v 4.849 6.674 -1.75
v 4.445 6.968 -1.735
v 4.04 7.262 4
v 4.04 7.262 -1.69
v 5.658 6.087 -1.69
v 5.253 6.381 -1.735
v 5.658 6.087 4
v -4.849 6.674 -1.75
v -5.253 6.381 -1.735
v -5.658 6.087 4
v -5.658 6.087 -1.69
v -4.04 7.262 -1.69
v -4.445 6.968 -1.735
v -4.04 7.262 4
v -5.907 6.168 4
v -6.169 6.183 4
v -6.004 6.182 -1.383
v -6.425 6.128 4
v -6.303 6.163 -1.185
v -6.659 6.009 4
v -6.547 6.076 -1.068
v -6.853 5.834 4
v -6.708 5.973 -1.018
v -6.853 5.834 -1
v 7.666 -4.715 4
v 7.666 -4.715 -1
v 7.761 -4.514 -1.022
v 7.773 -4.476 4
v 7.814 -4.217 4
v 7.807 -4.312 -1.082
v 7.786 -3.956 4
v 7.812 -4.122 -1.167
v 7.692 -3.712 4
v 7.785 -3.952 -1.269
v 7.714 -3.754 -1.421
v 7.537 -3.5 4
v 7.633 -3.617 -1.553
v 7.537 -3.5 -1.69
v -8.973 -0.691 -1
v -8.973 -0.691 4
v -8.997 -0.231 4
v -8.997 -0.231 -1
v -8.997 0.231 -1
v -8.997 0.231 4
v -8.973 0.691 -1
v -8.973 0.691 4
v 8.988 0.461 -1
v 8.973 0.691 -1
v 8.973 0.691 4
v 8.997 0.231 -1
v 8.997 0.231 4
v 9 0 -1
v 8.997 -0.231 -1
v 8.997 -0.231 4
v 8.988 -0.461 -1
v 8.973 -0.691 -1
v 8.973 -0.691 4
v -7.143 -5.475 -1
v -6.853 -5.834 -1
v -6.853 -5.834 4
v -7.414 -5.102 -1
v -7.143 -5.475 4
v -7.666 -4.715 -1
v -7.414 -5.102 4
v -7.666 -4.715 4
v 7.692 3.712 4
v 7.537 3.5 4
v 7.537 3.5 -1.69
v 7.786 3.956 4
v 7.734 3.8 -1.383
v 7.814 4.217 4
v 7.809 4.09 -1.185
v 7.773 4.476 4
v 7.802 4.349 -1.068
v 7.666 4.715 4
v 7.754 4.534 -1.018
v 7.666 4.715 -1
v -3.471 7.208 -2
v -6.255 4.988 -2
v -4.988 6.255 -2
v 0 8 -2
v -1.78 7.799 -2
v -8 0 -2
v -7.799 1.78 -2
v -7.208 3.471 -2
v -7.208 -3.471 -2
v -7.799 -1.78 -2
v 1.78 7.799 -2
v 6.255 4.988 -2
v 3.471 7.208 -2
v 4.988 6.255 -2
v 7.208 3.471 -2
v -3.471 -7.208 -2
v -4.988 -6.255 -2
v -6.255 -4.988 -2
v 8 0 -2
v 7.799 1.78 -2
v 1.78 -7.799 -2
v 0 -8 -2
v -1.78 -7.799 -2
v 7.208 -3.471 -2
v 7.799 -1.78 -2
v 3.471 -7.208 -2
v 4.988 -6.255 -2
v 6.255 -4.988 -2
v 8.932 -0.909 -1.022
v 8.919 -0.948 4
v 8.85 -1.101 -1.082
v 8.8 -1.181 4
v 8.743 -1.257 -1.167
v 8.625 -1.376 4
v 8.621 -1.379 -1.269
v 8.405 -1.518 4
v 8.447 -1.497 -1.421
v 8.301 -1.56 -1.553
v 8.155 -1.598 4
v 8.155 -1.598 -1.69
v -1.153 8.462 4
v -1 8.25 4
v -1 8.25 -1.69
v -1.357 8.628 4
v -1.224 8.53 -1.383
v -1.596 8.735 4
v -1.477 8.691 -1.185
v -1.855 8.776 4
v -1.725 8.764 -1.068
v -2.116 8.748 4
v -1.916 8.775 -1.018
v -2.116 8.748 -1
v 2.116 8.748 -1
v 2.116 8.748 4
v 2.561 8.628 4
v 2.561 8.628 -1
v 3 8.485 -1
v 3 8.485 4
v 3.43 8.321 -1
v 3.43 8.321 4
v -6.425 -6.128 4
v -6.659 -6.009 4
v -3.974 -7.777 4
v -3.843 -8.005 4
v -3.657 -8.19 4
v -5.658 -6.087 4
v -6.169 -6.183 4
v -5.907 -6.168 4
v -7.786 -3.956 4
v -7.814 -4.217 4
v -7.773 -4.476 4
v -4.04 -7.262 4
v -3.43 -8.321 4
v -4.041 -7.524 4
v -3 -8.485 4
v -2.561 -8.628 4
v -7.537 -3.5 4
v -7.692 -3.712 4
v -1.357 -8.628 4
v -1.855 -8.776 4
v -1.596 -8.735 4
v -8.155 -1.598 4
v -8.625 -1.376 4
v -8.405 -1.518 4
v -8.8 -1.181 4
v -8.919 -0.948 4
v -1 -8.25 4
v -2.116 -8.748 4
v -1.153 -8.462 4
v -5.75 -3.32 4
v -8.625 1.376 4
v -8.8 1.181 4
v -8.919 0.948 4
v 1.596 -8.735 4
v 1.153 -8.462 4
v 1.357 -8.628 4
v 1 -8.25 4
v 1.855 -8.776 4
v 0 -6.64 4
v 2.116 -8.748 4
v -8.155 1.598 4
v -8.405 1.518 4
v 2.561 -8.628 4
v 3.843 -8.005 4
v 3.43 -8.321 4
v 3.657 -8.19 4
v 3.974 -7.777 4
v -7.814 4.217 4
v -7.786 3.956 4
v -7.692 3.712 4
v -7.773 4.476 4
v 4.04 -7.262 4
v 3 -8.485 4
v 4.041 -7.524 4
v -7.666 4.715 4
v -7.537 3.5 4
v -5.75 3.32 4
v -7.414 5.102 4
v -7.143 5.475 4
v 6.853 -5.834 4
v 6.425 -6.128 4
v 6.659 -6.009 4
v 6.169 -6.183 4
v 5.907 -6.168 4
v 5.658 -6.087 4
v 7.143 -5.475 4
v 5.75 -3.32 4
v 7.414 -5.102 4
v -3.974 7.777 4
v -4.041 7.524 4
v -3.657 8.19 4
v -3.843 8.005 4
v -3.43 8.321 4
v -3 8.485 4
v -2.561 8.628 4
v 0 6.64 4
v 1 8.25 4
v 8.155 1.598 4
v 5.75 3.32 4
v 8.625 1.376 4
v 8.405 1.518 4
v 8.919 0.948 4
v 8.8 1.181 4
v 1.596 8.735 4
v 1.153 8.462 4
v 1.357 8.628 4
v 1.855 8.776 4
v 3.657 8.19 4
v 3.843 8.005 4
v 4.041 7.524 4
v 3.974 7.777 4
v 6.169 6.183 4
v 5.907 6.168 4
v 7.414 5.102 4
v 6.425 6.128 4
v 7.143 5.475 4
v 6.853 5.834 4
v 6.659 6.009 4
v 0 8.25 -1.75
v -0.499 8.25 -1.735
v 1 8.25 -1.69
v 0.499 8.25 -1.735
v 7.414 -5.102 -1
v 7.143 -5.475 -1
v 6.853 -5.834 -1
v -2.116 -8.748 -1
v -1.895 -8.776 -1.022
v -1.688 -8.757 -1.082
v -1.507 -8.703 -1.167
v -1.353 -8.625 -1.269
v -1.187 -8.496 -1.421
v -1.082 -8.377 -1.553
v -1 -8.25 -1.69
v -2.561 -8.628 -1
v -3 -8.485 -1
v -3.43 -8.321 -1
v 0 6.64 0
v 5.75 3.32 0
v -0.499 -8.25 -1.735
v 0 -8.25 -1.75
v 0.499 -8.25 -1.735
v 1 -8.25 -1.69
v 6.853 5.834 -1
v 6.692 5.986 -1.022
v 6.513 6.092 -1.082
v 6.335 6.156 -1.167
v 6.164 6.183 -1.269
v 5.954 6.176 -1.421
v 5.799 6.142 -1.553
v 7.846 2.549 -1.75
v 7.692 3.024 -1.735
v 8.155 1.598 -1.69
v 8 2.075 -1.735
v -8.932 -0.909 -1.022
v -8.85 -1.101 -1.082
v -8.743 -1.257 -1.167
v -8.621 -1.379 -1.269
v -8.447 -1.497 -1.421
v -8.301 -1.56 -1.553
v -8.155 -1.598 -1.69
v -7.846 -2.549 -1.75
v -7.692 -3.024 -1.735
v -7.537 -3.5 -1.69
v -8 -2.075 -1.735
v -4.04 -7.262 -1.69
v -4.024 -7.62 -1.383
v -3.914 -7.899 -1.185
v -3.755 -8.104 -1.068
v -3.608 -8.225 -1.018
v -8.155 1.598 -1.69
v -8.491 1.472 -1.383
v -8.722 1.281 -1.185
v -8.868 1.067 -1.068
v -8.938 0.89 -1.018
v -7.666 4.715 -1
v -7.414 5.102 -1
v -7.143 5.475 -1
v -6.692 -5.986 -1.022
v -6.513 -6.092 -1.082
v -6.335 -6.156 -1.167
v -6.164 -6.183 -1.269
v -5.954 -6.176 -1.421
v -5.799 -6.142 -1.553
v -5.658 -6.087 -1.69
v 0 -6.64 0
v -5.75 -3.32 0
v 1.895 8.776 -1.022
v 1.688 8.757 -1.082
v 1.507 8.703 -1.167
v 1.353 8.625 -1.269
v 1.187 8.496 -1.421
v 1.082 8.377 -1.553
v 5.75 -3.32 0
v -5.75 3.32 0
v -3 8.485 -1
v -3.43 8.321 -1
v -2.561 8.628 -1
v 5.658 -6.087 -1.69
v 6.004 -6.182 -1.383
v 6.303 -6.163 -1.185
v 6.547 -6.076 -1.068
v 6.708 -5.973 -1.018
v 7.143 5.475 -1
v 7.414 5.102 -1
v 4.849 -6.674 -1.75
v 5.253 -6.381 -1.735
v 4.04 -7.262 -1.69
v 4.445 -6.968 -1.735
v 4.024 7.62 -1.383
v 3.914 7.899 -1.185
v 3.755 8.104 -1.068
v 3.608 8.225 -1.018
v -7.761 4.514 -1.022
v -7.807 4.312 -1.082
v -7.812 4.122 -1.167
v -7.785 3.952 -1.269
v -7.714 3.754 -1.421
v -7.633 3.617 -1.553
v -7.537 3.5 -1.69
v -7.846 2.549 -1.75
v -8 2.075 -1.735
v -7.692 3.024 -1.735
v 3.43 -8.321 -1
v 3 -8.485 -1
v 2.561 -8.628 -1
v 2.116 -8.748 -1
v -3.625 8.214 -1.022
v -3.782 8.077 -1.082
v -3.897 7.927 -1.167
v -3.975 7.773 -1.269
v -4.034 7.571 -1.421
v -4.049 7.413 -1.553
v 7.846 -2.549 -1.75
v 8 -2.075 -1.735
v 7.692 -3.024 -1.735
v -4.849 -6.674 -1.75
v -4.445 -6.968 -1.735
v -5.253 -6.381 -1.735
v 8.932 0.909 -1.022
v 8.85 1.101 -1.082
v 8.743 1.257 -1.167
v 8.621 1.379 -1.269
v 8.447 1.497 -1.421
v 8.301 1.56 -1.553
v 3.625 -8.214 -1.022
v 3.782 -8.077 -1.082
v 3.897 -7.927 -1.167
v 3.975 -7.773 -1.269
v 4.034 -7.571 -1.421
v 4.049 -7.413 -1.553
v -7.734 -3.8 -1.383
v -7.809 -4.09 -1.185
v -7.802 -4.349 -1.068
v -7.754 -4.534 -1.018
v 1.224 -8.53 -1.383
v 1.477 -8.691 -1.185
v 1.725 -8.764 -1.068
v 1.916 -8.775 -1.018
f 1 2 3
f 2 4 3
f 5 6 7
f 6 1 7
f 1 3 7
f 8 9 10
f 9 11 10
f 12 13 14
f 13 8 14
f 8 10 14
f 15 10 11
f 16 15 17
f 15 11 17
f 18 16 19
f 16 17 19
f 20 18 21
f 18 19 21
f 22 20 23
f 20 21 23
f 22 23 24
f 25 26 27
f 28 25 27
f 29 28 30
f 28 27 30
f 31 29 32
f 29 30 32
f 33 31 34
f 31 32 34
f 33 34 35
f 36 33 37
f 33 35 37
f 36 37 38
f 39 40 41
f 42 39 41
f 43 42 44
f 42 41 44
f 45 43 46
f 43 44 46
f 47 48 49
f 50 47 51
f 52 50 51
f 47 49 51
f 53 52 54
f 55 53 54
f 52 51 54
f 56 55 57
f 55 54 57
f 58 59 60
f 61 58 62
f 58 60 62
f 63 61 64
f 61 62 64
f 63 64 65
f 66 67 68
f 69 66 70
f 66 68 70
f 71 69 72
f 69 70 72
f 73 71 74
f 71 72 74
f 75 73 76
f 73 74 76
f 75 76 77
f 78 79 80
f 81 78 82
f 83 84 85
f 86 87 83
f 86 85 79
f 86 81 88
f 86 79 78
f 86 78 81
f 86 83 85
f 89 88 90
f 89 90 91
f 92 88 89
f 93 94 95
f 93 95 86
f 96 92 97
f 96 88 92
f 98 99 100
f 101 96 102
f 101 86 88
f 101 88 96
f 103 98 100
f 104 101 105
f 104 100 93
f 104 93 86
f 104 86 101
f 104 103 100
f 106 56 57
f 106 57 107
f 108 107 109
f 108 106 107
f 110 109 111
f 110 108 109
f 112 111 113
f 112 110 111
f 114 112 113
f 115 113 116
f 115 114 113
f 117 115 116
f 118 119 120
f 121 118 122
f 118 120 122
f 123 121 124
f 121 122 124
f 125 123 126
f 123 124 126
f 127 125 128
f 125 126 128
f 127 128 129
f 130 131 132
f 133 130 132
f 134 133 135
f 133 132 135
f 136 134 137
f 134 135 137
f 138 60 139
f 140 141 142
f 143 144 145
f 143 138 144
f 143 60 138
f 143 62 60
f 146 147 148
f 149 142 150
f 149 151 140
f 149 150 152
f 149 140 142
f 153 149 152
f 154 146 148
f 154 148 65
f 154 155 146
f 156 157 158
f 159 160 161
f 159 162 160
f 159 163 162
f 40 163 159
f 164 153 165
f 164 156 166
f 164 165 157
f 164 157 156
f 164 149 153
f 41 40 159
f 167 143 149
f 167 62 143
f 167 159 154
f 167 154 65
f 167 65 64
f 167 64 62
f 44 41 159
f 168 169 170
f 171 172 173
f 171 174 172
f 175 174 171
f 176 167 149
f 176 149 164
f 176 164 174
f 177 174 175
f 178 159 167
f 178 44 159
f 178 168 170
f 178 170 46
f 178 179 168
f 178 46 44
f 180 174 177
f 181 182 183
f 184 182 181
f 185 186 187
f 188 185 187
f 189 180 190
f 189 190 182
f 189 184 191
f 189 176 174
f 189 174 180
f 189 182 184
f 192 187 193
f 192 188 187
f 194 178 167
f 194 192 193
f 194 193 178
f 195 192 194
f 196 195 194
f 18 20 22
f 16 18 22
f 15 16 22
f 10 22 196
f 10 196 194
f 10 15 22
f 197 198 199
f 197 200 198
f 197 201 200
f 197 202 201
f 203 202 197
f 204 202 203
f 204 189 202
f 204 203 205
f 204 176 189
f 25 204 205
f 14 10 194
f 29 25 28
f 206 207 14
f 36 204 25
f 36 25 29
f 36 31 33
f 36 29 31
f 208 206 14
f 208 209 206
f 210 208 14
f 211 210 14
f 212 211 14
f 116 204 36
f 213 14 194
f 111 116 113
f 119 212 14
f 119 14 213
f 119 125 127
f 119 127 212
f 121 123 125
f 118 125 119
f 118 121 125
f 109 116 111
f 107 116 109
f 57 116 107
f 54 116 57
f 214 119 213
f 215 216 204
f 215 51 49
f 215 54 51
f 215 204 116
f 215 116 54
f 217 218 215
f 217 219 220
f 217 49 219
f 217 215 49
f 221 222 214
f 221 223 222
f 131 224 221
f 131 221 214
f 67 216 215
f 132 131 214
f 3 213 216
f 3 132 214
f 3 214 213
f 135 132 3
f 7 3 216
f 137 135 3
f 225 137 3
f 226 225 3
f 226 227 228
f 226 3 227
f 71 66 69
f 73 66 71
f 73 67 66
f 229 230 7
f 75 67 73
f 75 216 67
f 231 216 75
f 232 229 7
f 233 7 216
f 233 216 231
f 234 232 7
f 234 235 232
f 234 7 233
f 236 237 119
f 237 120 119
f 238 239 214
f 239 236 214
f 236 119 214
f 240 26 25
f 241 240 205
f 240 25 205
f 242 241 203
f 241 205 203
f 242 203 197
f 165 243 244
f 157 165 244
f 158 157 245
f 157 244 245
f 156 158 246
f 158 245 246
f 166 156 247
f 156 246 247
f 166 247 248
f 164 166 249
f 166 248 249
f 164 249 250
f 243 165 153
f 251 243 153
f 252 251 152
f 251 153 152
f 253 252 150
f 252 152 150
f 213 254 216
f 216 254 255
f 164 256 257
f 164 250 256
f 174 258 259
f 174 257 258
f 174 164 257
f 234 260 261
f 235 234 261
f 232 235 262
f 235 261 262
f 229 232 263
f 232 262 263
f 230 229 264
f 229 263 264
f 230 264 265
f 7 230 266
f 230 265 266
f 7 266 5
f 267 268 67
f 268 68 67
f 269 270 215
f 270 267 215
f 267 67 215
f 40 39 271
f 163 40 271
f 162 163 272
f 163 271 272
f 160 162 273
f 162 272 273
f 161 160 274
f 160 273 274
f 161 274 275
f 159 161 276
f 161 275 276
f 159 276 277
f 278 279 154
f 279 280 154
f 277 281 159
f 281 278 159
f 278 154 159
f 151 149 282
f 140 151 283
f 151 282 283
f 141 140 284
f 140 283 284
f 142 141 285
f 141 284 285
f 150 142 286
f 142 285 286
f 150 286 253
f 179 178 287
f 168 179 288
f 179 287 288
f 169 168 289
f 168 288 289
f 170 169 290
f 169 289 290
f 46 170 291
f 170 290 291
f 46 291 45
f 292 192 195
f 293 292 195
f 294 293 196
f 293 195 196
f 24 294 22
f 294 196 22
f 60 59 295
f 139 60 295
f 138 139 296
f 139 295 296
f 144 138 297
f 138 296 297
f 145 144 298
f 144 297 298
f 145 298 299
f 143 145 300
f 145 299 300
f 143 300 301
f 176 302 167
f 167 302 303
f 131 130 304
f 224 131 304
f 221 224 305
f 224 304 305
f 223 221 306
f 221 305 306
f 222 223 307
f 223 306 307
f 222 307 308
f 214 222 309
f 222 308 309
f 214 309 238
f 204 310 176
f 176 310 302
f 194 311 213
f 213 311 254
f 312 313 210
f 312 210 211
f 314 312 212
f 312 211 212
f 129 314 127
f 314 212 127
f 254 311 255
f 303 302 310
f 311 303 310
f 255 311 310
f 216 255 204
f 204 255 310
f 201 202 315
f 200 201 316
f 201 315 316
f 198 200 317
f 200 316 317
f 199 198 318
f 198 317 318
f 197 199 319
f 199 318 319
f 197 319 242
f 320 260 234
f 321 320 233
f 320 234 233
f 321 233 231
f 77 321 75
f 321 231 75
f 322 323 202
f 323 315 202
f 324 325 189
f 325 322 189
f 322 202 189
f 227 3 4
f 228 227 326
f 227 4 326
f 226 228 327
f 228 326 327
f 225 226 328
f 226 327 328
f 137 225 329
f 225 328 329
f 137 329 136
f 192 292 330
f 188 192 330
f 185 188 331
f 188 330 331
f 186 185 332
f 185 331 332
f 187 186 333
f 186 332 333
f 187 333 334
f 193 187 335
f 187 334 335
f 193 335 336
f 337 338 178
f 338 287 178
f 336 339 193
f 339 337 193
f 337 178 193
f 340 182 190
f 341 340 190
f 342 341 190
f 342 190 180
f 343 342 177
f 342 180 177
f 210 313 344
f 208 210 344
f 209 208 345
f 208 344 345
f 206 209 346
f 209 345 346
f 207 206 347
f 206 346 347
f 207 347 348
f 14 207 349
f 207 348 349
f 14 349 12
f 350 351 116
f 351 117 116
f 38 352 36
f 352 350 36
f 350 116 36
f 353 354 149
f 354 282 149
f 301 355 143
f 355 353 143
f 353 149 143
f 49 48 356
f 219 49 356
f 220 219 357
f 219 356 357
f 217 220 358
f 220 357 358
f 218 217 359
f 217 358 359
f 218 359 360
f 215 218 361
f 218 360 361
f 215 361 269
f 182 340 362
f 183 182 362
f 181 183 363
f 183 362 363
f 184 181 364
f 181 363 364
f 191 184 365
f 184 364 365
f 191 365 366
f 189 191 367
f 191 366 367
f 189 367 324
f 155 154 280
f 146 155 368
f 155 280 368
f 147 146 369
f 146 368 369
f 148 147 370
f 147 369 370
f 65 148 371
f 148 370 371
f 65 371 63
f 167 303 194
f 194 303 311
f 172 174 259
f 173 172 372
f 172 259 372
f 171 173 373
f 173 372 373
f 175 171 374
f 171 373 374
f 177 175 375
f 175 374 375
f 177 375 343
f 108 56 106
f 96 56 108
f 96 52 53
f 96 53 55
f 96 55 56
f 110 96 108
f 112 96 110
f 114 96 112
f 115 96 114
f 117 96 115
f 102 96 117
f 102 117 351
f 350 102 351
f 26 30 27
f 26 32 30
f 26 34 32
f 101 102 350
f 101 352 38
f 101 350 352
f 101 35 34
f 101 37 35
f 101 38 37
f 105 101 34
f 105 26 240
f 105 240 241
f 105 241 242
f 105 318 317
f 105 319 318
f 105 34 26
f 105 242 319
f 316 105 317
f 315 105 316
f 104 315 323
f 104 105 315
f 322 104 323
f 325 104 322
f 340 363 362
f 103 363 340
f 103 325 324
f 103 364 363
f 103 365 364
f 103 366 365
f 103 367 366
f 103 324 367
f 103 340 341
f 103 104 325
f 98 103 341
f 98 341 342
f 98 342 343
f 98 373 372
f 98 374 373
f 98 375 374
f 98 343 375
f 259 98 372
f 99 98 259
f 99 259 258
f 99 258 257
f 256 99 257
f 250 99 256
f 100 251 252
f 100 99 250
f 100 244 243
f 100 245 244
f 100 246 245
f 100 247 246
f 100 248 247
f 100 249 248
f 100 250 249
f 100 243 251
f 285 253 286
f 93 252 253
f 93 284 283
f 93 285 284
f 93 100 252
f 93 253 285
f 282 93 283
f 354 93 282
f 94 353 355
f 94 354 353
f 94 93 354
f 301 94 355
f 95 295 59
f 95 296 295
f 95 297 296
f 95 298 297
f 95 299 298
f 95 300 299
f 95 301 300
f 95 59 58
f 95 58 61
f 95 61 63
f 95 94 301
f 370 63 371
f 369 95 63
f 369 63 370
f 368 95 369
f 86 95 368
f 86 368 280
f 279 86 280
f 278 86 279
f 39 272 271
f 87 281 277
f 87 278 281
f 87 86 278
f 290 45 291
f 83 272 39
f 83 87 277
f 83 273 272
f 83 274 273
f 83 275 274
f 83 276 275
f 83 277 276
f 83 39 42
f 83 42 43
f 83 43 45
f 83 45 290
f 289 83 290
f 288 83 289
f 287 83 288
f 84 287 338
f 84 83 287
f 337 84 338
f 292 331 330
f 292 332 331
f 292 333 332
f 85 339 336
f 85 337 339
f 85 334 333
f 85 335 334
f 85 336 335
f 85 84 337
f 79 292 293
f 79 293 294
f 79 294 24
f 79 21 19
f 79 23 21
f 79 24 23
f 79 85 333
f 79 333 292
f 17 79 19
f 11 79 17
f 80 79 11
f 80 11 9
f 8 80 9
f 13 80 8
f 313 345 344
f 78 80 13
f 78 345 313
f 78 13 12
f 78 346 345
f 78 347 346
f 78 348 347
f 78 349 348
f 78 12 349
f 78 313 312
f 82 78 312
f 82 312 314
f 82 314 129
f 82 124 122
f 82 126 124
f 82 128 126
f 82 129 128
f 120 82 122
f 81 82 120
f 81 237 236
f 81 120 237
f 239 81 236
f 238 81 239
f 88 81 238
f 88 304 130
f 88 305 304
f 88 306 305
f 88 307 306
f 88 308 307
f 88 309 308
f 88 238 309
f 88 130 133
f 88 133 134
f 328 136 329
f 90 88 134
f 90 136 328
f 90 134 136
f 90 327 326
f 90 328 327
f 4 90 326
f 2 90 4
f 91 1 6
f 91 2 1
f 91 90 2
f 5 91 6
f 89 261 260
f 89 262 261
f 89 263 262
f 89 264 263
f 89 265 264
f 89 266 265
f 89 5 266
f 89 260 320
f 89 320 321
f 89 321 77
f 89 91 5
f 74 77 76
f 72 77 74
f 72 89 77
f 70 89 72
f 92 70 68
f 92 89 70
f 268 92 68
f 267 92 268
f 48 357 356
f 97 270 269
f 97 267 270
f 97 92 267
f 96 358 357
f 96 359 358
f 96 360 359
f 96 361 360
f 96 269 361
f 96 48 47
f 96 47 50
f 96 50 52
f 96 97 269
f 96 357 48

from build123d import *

# Parameters (mm, degrees)
F0_R        = 9
F1_DEPTH    = 4
F2_R        = 9
F3_DEPTH    = 2
F4_SIZE     = 1
F5_W        = 2
F5_H        = 1.5
F6_DEPTH    = 6.001
F7_T1_DEPTH = 10.6633310907


# Not quite as in the source:
# - a fillet or chamfer that OpenCascade refuses, or shapes differently, is made with other operations: its cross-section is extruded or revolved along the edge and cut away or added


with BuildPart() as f1:
    # F0 (on Top) → F1 (new body)
    with BuildSketch(Plane.XY):
        Circle(F0_R)
        Polygon((-5.75, 3.3197640478), (0, 6.6395280957), (5.75, 3.3197640478), (5.75, -3.3197640478), (0, -6.6395280957), (-5.75, -3.3197640478), align=None, mode=Mode.SUBTRACT)
    extrude(amount=F1_DEPTH)

    # F2 (on face) → F3 (join)
    with BuildSketch(Plane(origin=(0, 0, 0), x_dir=(1, 0, 0), z_dir=(0, 0, -1))):
        Circle(F2_R)
    extrude(amount=F3_DEPTH)

    # F4
    f4_edges = [f1.edges().sort_by_distance(p)[0] for p in [
        (-9, 0, -2),
    ]]
    chamfer(f4_edges, length=F4_SIZE)

    # F5 (on face) → F6 (cut, through all)
    with BuildSketch(Plane.XY.offset(4)):
        with Locations((0, 9)):
            Rectangle(F5_W, F5_H)
        Polygon((-4.040211337, 7.2621754559), (-4.9218892155, 8.4757009474), (-6.5399232042, 7.3001304429), (-5.6582453258, 6.0866049513), align=None)
        Polygon((-7.5371992651, 3.5004467199), (-8.9637840395, 3.9639722115), (-9.5818180283, 2.0618591789), (-8.1552332538, 1.5983336873), align=None)
        Polygon((-8.1552332538, -1.5983336873), (-9.5818180283, -2.0618591789), (-8.9637840395, -3.9639722115), (-7.5371992651, -3.5004467199), align=None)
        Polygon((-5.6582453258, -6.0866049513), (-6.5399232042, -7.3001304429), (-4.9218892155, -8.4757009474), (-4.040211337, -7.2621754559), align=None)
        with Locations((0, -9)):
            Rectangle(F5_W, F5_H)
        Polygon((4.040211337, -7.2621754559), (4.9218892155, -8.4757009474), (6.5399232042, -7.3001304429), (5.6582453258, -6.0866049513), align=None)
        Polygon((7.5371992651, -3.5004467199), (8.9637840395, -3.9639722115), (9.5818180283, -2.0618591789), (8.1552332538, -1.5983336873), align=None)
        Polygon((8.1552332538, 1.5983336873), (9.5818180283, 2.0618591789), (8.9637840395, 3.9639722115), (7.5371992651, 3.5004467199), align=None)
        Polygon((5.6582453258, 6.0866049513), (6.5399232042, 7.3001304429), (4.9218892155, 8.4757009474), (4.040211337, 7.2621754559), align=None)
    extrude(amount=-F6_DEPTH, mode=Mode.SUBTRACT)

    # F7: fillet of radius 1 on 20 edges, made by hand

    # F7_s2 → F7_t1 (cut)
    with BuildSketch(Plane.XY.offset(-3.8316655453)):
        with BuildLine():
            ThreePointArc((2.1155025829, 8.7478368081), (1.4729019887, 8.6890401766), (1, 8.25))
            Line((1, 8.25), (1, 8.94427191))
            ThreePointArc((1, 8.94427191), (1.5608445705, 8.8636202664), (2.1155025829, 8.7478368081))
        make_face()
        with BuildLine():
            ThreePointArc((4.040211337, 7.2621754559), (3.9156869325, 7.8953312347), (3.4303719241, 8.3206098612))
            ThreePointArc((3.4303719241, 8.3206098612), (3.9471554914, 8.0882608469), (4.4482941268, 7.8238532298))
            Line((4.4482941268, 7.8238532298), (4.040211337, 7.2621754559))
        make_face()
        with BuildLine():
            ThreePointArc((6.8533270065, 5.8336874224), (6.2988924123, 6.1638311007), (5.6582453258, 6.0866049513))
            Line((5.6582453258, 6.0866049513), (6.0663281156, 6.6482827252))
            ThreePointArc((6.0663281156, 6.6482827252), (6.4726550576, 6.2533780075), (6.8533270065, 5.8336874224))
        make_face()
        with BuildLine():
            ThreePointArc((7.5371992651, 3.5004467199), (7.8086165348, 4.0858741136), (7.6659609501, 4.7151927544))
            ThreePointArc((7.6659609501, 4.7151927544), (7.9474763144, 4.2234606937), (8.1974910891, 3.7149885388))
            Line((8.1974910891, 3.7149885388), (7.5371992651, 3.5004467199))
        make_face()
        with BuildLine():
            ThreePointArc((8.9734134496, 0.691267721), (8.7189200259, 1.2842480452), (8.1552332538, 1.5983336873))
            Line((8.1552332538, 1.5983336873), (8.8155250779, 1.8128755062))
            ThreePointArc((8.8155250779, 1.8128755062), (8.9121313102, 1.2545578943), (8.9734134496, 0.691267721))
        make_face()
        with BuildLine():
            ThreePointArc((8.9734134496, -0.691267721), (8.7189200259, -1.2842480452), (8.1552332538, -1.5983336873))
            Line((8.1552332538, -1.5983336873), (8.8155250779, -1.8128755062))
            ThreePointArc((8.8155250779, -1.8128755062), (8.9121313102, -1.2545578943), (8.9734134496, -0.691267721))
        make_face()
        with BuildLine():
            ThreePointArc((7.6659609501, -4.7151927544), (7.8086165348, -4.0858741136), (7.5371992651, -3.5004467199))
            Line((7.5371992651, -3.5004467199), (8.1974910891, -3.7149885388))
            ThreePointArc((8.1974910891, -3.7149885388), (7.9474763144, -4.2234606937), (7.6659609501, -4.7151927544))
        make_face()
        with BuildLine():
            ThreePointArc((5.6582453258, -6.0866049513), (6.2988924123, -6.1638311007), (6.8533270065, -5.8336874224))
            ThreePointArc((6.8533270065, -5.8336874224), (6.4726550576, -6.2533780075), (6.0663281156, -6.6482827252))
            Line((6.0663281156, -6.6482827252), (5.6582453258, -6.0866049513))
        make_face()
        with BuildLine():
            ThreePointArc((3.4303719241, -8.3206098612), (3.9156869325, -7.8953312347), (4.040211337, -7.2621754559))
            Line((4.040211337, -7.2621754559), (4.4482941268, -7.8238532298))
            ThreePointArc((4.4482941268, -7.8238532298), (3.9471554914, -8.0882608469), (3.4303719241, -8.3206098612))
        make_face()
        with BuildLine():
            ThreePointArc((1, -8.25), (1.4729019887, -8.6890401766), (2.1155025829, -8.7478368081))
            ThreePointArc((2.1155025829, -8.7478368081), (1.5608445705, -8.8636202664), (1, -8.94427191))
            Line((1, -8.94427191), (1, -8.25))
        make_face()
        with BuildLine():
            ThreePointArc((-2.1155025829, -8.7478368081), (-1.4729019887, -8.6890401766), (-1, -8.25))
            Line((-1, -8.25), (-1, -8.94427191))
            ThreePointArc((-1, -8.94427191), (-1.5608445705, -8.8636202664), (-2.1155025829, -8.7478368081))
        make_face()
        with BuildLine():
            ThreePointArc((-4.040211337, -7.2621754559), (-3.9156869325, -7.8953312347), (-3.4303719241, -8.3206098612))
            ThreePointArc((-3.4303719241, -8.3206098612), (-3.9471554914, -8.0882608469), (-4.4482941268, -7.8238532298))
            Line((-4.4482941268, -7.8238532298), (-4.040211337, -7.2621754559))
        make_face()
        with BuildLine():
            ThreePointArc((-6.8533270065, -5.8336874224), (-6.2988924123, -6.1638311007), (-5.6582453258, -6.0866049513))
            Line((-5.6582453258, -6.0866049513), (-6.0663281156, -6.6482827252))
            ThreePointArc((-6.0663281156, -6.6482827252), (-6.4726550576, -6.2533780075), (-6.8533270065, -5.8336874224))
        make_face()
        with BuildLine():
            ThreePointArc((-7.5371992651, -3.5004467199), (-7.8086165348, -4.0858741136), (-7.6659609501, -4.7151927544))
            ThreePointArc((-7.6659609501, -4.7151927544), (-7.9474763144, -4.2234606937), (-8.1974910891, -3.7149885388))
            Line((-8.1974910891, -3.7149885388), (-7.5371992651, -3.5004467199))
        make_face()
        with BuildLine():
            ThreePointArc((-8.9734134496, -0.691267721), (-8.7189200259, -1.2842480452), (-8.1552332538, -1.5983336873))
            Line((-8.1552332538, -1.5983336873), (-8.8155250779, -1.8128755062))
            ThreePointArc((-8.8155250779, -1.8128755062), (-8.9121313102, -1.2545578943), (-8.9734134496, -0.691267721))
        make_face()
        with BuildLine():
            ThreePointArc((-8.1552332538, 1.5983336873), (-8.7189200259, 1.2842480452), (-8.9734134496, 0.691267721))
            ThreePointArc((-8.9734134496, 0.691267721), (-8.9121313102, 1.2545578943), (-8.8155250779, 1.8128755062))
            Line((-8.8155250779, 1.8128755062), (-8.1552332538, 1.5983336873))
        make_face()
        with BuildLine():
            ThreePointArc((-7.6659609501, 4.7151927544), (-7.8086165348, 4.0858741136), (-7.5371992651, 3.5004467199))
            Line((-7.5371992651, 3.5004467199), (-8.1974910891, 3.7149885388))
            ThreePointArc((-8.1974910891, 3.7149885388), (-7.9474763144, 4.2234606937), (-7.6659609501, 4.7151927544))
        make_face()
        with BuildLine():
            ThreePointArc((-5.6582453258, 6.0866049513), (-6.2988924123, 6.1638311007), (-6.8533270065, 5.8336874224))
            ThreePointArc((-6.8533270065, 5.8336874224), (-6.4726550576, 6.2533780075), (-6.0663281156, 6.6482827252))
            Line((-6.0663281156, 6.6482827252), (-5.6582453258, 6.0866049513))
        make_face()
        with BuildLine():
            ThreePointArc((-3.4303719241, 8.3206098612), (-3.9156869325, 7.8953312347), (-4.040211337, 7.2621754559))
            Line((-4.040211337, 7.2621754559), (-4.4482941268, 7.8238532298))
            ThreePointArc((-4.4482941268, 7.8238532298), (-3.9471554914, 8.0882608469), (-3.4303719241, 8.3206098612))
        make_face()
        with BuildLine():
            ThreePointArc((-1, 8.25), (-1.4729019887, 8.6890401766), (-2.1155025829, 8.7478368081))
            ThreePointArc((-2.1155025829, 8.7478368081), (-1.5608445705, 8.8636202664), (-1, 8.94427191))
            Line((-1, 8.94427191), (-1, 8.25))
        make_face()
    extrude(amount=F7_T1_DEPTH, mode=Mode.SUBTRACT)


solid = f1.part
